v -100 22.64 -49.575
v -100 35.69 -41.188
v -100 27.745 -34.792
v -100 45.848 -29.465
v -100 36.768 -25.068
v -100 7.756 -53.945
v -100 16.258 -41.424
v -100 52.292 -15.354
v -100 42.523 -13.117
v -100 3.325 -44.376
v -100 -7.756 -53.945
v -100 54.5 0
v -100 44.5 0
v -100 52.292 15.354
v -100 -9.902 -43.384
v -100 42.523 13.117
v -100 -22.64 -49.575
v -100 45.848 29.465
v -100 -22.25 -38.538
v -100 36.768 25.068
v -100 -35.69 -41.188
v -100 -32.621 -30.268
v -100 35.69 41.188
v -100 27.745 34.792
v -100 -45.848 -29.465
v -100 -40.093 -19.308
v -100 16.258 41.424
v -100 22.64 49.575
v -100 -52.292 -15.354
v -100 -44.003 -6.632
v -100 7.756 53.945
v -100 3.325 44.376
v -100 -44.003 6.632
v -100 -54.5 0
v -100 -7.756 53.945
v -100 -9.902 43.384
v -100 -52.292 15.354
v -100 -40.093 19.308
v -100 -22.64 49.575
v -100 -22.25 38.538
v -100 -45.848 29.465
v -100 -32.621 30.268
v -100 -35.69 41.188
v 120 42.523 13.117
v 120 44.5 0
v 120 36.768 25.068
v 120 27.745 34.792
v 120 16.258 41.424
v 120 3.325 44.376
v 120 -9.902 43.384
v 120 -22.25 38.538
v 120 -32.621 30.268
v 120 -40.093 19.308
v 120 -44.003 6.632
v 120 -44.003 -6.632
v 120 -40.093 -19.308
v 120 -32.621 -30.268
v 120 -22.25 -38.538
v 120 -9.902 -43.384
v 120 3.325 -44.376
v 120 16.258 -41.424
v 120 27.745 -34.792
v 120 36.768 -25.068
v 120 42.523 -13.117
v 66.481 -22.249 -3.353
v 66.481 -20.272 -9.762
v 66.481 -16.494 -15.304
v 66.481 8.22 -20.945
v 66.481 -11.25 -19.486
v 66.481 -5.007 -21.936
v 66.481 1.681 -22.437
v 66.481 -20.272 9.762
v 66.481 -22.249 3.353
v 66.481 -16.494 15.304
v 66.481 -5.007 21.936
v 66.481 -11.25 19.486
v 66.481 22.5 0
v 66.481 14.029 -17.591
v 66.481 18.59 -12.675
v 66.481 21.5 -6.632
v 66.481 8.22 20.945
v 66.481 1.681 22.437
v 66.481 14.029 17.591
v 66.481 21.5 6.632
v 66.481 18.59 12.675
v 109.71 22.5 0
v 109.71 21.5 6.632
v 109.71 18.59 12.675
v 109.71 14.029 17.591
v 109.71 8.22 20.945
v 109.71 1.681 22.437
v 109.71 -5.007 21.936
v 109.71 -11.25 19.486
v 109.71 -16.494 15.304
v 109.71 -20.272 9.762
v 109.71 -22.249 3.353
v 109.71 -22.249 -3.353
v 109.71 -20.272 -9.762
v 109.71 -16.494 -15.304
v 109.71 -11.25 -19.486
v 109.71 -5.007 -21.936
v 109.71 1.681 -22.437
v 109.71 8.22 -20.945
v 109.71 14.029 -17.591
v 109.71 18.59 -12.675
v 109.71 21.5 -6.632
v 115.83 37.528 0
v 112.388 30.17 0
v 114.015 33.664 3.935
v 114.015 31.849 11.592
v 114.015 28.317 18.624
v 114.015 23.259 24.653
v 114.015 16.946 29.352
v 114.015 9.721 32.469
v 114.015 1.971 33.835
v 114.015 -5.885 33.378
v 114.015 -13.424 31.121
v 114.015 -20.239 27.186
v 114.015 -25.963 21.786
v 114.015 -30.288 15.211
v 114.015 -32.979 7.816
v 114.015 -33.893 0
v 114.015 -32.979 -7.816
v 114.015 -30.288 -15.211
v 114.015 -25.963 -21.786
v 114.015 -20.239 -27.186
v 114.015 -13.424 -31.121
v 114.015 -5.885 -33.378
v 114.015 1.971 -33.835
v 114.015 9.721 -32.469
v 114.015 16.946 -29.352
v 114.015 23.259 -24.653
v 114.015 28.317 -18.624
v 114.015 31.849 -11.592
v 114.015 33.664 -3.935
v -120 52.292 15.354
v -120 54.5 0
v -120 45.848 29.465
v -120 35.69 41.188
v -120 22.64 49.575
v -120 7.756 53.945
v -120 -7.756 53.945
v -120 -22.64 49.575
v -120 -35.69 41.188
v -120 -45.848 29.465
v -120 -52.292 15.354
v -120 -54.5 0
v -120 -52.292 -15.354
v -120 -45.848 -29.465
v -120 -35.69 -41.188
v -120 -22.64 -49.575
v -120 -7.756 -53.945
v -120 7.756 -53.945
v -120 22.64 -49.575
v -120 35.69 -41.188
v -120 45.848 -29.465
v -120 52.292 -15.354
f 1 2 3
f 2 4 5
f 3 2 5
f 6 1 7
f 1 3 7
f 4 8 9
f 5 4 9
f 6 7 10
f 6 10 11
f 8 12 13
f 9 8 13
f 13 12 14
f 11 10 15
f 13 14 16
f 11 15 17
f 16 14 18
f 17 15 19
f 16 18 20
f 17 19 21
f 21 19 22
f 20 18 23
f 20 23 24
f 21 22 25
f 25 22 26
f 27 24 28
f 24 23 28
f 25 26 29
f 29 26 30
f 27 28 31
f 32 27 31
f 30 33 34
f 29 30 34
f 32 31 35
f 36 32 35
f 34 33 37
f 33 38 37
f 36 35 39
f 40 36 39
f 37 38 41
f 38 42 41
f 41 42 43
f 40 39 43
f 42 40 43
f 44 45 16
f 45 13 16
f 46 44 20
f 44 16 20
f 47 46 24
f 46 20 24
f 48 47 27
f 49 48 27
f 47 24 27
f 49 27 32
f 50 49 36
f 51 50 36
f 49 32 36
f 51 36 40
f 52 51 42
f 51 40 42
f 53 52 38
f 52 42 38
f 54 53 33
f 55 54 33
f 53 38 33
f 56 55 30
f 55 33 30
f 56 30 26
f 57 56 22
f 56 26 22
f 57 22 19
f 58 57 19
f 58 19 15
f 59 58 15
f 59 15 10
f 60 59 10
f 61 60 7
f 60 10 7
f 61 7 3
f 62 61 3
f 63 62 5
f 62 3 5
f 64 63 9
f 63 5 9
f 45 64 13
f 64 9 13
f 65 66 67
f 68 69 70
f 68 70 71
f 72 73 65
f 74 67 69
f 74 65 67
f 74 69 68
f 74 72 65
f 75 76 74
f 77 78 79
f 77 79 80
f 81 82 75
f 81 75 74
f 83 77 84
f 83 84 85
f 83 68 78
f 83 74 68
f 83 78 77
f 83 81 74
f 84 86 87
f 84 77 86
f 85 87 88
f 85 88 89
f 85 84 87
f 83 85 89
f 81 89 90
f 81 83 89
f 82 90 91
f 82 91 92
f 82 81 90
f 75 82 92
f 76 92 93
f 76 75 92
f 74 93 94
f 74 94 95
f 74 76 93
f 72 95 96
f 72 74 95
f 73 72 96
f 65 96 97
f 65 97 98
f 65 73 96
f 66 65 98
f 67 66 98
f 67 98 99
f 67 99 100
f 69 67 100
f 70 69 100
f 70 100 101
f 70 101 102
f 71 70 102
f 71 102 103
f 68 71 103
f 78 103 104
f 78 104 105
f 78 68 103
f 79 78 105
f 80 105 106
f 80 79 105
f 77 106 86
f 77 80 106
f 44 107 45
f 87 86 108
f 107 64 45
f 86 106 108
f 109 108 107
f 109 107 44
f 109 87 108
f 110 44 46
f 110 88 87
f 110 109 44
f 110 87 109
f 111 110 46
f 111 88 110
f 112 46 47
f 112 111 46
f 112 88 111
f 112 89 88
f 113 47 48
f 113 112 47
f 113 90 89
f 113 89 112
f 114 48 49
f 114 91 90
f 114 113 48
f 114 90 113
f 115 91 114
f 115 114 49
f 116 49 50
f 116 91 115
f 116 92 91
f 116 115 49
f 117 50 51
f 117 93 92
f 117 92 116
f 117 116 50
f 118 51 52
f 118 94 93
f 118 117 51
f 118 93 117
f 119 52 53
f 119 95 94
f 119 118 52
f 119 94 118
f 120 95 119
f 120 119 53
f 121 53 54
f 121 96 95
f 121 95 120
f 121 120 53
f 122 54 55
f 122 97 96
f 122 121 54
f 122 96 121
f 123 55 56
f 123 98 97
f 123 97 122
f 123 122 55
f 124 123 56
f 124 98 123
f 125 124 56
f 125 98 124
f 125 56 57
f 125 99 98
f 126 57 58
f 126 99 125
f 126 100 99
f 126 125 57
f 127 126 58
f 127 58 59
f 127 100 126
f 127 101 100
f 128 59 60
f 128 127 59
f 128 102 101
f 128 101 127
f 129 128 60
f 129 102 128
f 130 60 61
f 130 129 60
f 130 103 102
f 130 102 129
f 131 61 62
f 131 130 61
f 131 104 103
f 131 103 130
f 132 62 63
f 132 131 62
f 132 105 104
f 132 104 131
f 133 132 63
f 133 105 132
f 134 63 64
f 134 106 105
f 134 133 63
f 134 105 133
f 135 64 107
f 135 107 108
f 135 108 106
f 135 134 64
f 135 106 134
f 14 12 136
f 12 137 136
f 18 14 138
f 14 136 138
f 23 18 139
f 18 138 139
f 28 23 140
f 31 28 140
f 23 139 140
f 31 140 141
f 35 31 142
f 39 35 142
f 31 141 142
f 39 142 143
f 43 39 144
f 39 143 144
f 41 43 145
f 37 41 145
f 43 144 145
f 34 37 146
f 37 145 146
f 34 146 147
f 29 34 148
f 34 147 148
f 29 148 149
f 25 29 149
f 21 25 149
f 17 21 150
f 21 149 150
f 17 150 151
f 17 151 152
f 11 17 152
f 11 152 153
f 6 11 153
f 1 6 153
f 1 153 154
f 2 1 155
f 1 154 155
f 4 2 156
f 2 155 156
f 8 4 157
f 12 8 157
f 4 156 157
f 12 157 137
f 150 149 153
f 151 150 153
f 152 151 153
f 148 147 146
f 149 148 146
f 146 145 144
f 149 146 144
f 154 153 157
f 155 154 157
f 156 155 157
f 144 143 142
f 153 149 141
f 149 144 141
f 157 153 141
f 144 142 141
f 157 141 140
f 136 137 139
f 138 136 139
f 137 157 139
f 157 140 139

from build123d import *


with BuildPart() as part:
    # Sketch1 → Revolve1 (revolve)
    with BuildSketch(Plane.XY):
        Polygon((-120, 0), (120, 0), (120, 44.5), (-100, 44.5), (-100, 54.5), (-120, 54.5), align=None)
    revolve(axis=Axis((-120, 0, 0), (1, 0, 0)))

    # Sketch2 → Cut-Revolve2 (revolve, cut)
    with BuildSketch(Plane.XY):
        with BuildLine():
            Line((66.48120035, 0), (266.48120035, 0))
            ThreePointArc((266.48120035, 0), (197.846476125, 79.188575606), (109.710437686, 22.5))
            Line((109.710437686, 22.5), (66.48120035, 22.5))
            Line((66.48120035, 22.5), (66.48120035, 0))
        make_face()
    revolve(axis=Axis((66.48120035, 0, 0), (1, 0, 0)), mode=Mode.SUBTRACT)


solid = part.part
